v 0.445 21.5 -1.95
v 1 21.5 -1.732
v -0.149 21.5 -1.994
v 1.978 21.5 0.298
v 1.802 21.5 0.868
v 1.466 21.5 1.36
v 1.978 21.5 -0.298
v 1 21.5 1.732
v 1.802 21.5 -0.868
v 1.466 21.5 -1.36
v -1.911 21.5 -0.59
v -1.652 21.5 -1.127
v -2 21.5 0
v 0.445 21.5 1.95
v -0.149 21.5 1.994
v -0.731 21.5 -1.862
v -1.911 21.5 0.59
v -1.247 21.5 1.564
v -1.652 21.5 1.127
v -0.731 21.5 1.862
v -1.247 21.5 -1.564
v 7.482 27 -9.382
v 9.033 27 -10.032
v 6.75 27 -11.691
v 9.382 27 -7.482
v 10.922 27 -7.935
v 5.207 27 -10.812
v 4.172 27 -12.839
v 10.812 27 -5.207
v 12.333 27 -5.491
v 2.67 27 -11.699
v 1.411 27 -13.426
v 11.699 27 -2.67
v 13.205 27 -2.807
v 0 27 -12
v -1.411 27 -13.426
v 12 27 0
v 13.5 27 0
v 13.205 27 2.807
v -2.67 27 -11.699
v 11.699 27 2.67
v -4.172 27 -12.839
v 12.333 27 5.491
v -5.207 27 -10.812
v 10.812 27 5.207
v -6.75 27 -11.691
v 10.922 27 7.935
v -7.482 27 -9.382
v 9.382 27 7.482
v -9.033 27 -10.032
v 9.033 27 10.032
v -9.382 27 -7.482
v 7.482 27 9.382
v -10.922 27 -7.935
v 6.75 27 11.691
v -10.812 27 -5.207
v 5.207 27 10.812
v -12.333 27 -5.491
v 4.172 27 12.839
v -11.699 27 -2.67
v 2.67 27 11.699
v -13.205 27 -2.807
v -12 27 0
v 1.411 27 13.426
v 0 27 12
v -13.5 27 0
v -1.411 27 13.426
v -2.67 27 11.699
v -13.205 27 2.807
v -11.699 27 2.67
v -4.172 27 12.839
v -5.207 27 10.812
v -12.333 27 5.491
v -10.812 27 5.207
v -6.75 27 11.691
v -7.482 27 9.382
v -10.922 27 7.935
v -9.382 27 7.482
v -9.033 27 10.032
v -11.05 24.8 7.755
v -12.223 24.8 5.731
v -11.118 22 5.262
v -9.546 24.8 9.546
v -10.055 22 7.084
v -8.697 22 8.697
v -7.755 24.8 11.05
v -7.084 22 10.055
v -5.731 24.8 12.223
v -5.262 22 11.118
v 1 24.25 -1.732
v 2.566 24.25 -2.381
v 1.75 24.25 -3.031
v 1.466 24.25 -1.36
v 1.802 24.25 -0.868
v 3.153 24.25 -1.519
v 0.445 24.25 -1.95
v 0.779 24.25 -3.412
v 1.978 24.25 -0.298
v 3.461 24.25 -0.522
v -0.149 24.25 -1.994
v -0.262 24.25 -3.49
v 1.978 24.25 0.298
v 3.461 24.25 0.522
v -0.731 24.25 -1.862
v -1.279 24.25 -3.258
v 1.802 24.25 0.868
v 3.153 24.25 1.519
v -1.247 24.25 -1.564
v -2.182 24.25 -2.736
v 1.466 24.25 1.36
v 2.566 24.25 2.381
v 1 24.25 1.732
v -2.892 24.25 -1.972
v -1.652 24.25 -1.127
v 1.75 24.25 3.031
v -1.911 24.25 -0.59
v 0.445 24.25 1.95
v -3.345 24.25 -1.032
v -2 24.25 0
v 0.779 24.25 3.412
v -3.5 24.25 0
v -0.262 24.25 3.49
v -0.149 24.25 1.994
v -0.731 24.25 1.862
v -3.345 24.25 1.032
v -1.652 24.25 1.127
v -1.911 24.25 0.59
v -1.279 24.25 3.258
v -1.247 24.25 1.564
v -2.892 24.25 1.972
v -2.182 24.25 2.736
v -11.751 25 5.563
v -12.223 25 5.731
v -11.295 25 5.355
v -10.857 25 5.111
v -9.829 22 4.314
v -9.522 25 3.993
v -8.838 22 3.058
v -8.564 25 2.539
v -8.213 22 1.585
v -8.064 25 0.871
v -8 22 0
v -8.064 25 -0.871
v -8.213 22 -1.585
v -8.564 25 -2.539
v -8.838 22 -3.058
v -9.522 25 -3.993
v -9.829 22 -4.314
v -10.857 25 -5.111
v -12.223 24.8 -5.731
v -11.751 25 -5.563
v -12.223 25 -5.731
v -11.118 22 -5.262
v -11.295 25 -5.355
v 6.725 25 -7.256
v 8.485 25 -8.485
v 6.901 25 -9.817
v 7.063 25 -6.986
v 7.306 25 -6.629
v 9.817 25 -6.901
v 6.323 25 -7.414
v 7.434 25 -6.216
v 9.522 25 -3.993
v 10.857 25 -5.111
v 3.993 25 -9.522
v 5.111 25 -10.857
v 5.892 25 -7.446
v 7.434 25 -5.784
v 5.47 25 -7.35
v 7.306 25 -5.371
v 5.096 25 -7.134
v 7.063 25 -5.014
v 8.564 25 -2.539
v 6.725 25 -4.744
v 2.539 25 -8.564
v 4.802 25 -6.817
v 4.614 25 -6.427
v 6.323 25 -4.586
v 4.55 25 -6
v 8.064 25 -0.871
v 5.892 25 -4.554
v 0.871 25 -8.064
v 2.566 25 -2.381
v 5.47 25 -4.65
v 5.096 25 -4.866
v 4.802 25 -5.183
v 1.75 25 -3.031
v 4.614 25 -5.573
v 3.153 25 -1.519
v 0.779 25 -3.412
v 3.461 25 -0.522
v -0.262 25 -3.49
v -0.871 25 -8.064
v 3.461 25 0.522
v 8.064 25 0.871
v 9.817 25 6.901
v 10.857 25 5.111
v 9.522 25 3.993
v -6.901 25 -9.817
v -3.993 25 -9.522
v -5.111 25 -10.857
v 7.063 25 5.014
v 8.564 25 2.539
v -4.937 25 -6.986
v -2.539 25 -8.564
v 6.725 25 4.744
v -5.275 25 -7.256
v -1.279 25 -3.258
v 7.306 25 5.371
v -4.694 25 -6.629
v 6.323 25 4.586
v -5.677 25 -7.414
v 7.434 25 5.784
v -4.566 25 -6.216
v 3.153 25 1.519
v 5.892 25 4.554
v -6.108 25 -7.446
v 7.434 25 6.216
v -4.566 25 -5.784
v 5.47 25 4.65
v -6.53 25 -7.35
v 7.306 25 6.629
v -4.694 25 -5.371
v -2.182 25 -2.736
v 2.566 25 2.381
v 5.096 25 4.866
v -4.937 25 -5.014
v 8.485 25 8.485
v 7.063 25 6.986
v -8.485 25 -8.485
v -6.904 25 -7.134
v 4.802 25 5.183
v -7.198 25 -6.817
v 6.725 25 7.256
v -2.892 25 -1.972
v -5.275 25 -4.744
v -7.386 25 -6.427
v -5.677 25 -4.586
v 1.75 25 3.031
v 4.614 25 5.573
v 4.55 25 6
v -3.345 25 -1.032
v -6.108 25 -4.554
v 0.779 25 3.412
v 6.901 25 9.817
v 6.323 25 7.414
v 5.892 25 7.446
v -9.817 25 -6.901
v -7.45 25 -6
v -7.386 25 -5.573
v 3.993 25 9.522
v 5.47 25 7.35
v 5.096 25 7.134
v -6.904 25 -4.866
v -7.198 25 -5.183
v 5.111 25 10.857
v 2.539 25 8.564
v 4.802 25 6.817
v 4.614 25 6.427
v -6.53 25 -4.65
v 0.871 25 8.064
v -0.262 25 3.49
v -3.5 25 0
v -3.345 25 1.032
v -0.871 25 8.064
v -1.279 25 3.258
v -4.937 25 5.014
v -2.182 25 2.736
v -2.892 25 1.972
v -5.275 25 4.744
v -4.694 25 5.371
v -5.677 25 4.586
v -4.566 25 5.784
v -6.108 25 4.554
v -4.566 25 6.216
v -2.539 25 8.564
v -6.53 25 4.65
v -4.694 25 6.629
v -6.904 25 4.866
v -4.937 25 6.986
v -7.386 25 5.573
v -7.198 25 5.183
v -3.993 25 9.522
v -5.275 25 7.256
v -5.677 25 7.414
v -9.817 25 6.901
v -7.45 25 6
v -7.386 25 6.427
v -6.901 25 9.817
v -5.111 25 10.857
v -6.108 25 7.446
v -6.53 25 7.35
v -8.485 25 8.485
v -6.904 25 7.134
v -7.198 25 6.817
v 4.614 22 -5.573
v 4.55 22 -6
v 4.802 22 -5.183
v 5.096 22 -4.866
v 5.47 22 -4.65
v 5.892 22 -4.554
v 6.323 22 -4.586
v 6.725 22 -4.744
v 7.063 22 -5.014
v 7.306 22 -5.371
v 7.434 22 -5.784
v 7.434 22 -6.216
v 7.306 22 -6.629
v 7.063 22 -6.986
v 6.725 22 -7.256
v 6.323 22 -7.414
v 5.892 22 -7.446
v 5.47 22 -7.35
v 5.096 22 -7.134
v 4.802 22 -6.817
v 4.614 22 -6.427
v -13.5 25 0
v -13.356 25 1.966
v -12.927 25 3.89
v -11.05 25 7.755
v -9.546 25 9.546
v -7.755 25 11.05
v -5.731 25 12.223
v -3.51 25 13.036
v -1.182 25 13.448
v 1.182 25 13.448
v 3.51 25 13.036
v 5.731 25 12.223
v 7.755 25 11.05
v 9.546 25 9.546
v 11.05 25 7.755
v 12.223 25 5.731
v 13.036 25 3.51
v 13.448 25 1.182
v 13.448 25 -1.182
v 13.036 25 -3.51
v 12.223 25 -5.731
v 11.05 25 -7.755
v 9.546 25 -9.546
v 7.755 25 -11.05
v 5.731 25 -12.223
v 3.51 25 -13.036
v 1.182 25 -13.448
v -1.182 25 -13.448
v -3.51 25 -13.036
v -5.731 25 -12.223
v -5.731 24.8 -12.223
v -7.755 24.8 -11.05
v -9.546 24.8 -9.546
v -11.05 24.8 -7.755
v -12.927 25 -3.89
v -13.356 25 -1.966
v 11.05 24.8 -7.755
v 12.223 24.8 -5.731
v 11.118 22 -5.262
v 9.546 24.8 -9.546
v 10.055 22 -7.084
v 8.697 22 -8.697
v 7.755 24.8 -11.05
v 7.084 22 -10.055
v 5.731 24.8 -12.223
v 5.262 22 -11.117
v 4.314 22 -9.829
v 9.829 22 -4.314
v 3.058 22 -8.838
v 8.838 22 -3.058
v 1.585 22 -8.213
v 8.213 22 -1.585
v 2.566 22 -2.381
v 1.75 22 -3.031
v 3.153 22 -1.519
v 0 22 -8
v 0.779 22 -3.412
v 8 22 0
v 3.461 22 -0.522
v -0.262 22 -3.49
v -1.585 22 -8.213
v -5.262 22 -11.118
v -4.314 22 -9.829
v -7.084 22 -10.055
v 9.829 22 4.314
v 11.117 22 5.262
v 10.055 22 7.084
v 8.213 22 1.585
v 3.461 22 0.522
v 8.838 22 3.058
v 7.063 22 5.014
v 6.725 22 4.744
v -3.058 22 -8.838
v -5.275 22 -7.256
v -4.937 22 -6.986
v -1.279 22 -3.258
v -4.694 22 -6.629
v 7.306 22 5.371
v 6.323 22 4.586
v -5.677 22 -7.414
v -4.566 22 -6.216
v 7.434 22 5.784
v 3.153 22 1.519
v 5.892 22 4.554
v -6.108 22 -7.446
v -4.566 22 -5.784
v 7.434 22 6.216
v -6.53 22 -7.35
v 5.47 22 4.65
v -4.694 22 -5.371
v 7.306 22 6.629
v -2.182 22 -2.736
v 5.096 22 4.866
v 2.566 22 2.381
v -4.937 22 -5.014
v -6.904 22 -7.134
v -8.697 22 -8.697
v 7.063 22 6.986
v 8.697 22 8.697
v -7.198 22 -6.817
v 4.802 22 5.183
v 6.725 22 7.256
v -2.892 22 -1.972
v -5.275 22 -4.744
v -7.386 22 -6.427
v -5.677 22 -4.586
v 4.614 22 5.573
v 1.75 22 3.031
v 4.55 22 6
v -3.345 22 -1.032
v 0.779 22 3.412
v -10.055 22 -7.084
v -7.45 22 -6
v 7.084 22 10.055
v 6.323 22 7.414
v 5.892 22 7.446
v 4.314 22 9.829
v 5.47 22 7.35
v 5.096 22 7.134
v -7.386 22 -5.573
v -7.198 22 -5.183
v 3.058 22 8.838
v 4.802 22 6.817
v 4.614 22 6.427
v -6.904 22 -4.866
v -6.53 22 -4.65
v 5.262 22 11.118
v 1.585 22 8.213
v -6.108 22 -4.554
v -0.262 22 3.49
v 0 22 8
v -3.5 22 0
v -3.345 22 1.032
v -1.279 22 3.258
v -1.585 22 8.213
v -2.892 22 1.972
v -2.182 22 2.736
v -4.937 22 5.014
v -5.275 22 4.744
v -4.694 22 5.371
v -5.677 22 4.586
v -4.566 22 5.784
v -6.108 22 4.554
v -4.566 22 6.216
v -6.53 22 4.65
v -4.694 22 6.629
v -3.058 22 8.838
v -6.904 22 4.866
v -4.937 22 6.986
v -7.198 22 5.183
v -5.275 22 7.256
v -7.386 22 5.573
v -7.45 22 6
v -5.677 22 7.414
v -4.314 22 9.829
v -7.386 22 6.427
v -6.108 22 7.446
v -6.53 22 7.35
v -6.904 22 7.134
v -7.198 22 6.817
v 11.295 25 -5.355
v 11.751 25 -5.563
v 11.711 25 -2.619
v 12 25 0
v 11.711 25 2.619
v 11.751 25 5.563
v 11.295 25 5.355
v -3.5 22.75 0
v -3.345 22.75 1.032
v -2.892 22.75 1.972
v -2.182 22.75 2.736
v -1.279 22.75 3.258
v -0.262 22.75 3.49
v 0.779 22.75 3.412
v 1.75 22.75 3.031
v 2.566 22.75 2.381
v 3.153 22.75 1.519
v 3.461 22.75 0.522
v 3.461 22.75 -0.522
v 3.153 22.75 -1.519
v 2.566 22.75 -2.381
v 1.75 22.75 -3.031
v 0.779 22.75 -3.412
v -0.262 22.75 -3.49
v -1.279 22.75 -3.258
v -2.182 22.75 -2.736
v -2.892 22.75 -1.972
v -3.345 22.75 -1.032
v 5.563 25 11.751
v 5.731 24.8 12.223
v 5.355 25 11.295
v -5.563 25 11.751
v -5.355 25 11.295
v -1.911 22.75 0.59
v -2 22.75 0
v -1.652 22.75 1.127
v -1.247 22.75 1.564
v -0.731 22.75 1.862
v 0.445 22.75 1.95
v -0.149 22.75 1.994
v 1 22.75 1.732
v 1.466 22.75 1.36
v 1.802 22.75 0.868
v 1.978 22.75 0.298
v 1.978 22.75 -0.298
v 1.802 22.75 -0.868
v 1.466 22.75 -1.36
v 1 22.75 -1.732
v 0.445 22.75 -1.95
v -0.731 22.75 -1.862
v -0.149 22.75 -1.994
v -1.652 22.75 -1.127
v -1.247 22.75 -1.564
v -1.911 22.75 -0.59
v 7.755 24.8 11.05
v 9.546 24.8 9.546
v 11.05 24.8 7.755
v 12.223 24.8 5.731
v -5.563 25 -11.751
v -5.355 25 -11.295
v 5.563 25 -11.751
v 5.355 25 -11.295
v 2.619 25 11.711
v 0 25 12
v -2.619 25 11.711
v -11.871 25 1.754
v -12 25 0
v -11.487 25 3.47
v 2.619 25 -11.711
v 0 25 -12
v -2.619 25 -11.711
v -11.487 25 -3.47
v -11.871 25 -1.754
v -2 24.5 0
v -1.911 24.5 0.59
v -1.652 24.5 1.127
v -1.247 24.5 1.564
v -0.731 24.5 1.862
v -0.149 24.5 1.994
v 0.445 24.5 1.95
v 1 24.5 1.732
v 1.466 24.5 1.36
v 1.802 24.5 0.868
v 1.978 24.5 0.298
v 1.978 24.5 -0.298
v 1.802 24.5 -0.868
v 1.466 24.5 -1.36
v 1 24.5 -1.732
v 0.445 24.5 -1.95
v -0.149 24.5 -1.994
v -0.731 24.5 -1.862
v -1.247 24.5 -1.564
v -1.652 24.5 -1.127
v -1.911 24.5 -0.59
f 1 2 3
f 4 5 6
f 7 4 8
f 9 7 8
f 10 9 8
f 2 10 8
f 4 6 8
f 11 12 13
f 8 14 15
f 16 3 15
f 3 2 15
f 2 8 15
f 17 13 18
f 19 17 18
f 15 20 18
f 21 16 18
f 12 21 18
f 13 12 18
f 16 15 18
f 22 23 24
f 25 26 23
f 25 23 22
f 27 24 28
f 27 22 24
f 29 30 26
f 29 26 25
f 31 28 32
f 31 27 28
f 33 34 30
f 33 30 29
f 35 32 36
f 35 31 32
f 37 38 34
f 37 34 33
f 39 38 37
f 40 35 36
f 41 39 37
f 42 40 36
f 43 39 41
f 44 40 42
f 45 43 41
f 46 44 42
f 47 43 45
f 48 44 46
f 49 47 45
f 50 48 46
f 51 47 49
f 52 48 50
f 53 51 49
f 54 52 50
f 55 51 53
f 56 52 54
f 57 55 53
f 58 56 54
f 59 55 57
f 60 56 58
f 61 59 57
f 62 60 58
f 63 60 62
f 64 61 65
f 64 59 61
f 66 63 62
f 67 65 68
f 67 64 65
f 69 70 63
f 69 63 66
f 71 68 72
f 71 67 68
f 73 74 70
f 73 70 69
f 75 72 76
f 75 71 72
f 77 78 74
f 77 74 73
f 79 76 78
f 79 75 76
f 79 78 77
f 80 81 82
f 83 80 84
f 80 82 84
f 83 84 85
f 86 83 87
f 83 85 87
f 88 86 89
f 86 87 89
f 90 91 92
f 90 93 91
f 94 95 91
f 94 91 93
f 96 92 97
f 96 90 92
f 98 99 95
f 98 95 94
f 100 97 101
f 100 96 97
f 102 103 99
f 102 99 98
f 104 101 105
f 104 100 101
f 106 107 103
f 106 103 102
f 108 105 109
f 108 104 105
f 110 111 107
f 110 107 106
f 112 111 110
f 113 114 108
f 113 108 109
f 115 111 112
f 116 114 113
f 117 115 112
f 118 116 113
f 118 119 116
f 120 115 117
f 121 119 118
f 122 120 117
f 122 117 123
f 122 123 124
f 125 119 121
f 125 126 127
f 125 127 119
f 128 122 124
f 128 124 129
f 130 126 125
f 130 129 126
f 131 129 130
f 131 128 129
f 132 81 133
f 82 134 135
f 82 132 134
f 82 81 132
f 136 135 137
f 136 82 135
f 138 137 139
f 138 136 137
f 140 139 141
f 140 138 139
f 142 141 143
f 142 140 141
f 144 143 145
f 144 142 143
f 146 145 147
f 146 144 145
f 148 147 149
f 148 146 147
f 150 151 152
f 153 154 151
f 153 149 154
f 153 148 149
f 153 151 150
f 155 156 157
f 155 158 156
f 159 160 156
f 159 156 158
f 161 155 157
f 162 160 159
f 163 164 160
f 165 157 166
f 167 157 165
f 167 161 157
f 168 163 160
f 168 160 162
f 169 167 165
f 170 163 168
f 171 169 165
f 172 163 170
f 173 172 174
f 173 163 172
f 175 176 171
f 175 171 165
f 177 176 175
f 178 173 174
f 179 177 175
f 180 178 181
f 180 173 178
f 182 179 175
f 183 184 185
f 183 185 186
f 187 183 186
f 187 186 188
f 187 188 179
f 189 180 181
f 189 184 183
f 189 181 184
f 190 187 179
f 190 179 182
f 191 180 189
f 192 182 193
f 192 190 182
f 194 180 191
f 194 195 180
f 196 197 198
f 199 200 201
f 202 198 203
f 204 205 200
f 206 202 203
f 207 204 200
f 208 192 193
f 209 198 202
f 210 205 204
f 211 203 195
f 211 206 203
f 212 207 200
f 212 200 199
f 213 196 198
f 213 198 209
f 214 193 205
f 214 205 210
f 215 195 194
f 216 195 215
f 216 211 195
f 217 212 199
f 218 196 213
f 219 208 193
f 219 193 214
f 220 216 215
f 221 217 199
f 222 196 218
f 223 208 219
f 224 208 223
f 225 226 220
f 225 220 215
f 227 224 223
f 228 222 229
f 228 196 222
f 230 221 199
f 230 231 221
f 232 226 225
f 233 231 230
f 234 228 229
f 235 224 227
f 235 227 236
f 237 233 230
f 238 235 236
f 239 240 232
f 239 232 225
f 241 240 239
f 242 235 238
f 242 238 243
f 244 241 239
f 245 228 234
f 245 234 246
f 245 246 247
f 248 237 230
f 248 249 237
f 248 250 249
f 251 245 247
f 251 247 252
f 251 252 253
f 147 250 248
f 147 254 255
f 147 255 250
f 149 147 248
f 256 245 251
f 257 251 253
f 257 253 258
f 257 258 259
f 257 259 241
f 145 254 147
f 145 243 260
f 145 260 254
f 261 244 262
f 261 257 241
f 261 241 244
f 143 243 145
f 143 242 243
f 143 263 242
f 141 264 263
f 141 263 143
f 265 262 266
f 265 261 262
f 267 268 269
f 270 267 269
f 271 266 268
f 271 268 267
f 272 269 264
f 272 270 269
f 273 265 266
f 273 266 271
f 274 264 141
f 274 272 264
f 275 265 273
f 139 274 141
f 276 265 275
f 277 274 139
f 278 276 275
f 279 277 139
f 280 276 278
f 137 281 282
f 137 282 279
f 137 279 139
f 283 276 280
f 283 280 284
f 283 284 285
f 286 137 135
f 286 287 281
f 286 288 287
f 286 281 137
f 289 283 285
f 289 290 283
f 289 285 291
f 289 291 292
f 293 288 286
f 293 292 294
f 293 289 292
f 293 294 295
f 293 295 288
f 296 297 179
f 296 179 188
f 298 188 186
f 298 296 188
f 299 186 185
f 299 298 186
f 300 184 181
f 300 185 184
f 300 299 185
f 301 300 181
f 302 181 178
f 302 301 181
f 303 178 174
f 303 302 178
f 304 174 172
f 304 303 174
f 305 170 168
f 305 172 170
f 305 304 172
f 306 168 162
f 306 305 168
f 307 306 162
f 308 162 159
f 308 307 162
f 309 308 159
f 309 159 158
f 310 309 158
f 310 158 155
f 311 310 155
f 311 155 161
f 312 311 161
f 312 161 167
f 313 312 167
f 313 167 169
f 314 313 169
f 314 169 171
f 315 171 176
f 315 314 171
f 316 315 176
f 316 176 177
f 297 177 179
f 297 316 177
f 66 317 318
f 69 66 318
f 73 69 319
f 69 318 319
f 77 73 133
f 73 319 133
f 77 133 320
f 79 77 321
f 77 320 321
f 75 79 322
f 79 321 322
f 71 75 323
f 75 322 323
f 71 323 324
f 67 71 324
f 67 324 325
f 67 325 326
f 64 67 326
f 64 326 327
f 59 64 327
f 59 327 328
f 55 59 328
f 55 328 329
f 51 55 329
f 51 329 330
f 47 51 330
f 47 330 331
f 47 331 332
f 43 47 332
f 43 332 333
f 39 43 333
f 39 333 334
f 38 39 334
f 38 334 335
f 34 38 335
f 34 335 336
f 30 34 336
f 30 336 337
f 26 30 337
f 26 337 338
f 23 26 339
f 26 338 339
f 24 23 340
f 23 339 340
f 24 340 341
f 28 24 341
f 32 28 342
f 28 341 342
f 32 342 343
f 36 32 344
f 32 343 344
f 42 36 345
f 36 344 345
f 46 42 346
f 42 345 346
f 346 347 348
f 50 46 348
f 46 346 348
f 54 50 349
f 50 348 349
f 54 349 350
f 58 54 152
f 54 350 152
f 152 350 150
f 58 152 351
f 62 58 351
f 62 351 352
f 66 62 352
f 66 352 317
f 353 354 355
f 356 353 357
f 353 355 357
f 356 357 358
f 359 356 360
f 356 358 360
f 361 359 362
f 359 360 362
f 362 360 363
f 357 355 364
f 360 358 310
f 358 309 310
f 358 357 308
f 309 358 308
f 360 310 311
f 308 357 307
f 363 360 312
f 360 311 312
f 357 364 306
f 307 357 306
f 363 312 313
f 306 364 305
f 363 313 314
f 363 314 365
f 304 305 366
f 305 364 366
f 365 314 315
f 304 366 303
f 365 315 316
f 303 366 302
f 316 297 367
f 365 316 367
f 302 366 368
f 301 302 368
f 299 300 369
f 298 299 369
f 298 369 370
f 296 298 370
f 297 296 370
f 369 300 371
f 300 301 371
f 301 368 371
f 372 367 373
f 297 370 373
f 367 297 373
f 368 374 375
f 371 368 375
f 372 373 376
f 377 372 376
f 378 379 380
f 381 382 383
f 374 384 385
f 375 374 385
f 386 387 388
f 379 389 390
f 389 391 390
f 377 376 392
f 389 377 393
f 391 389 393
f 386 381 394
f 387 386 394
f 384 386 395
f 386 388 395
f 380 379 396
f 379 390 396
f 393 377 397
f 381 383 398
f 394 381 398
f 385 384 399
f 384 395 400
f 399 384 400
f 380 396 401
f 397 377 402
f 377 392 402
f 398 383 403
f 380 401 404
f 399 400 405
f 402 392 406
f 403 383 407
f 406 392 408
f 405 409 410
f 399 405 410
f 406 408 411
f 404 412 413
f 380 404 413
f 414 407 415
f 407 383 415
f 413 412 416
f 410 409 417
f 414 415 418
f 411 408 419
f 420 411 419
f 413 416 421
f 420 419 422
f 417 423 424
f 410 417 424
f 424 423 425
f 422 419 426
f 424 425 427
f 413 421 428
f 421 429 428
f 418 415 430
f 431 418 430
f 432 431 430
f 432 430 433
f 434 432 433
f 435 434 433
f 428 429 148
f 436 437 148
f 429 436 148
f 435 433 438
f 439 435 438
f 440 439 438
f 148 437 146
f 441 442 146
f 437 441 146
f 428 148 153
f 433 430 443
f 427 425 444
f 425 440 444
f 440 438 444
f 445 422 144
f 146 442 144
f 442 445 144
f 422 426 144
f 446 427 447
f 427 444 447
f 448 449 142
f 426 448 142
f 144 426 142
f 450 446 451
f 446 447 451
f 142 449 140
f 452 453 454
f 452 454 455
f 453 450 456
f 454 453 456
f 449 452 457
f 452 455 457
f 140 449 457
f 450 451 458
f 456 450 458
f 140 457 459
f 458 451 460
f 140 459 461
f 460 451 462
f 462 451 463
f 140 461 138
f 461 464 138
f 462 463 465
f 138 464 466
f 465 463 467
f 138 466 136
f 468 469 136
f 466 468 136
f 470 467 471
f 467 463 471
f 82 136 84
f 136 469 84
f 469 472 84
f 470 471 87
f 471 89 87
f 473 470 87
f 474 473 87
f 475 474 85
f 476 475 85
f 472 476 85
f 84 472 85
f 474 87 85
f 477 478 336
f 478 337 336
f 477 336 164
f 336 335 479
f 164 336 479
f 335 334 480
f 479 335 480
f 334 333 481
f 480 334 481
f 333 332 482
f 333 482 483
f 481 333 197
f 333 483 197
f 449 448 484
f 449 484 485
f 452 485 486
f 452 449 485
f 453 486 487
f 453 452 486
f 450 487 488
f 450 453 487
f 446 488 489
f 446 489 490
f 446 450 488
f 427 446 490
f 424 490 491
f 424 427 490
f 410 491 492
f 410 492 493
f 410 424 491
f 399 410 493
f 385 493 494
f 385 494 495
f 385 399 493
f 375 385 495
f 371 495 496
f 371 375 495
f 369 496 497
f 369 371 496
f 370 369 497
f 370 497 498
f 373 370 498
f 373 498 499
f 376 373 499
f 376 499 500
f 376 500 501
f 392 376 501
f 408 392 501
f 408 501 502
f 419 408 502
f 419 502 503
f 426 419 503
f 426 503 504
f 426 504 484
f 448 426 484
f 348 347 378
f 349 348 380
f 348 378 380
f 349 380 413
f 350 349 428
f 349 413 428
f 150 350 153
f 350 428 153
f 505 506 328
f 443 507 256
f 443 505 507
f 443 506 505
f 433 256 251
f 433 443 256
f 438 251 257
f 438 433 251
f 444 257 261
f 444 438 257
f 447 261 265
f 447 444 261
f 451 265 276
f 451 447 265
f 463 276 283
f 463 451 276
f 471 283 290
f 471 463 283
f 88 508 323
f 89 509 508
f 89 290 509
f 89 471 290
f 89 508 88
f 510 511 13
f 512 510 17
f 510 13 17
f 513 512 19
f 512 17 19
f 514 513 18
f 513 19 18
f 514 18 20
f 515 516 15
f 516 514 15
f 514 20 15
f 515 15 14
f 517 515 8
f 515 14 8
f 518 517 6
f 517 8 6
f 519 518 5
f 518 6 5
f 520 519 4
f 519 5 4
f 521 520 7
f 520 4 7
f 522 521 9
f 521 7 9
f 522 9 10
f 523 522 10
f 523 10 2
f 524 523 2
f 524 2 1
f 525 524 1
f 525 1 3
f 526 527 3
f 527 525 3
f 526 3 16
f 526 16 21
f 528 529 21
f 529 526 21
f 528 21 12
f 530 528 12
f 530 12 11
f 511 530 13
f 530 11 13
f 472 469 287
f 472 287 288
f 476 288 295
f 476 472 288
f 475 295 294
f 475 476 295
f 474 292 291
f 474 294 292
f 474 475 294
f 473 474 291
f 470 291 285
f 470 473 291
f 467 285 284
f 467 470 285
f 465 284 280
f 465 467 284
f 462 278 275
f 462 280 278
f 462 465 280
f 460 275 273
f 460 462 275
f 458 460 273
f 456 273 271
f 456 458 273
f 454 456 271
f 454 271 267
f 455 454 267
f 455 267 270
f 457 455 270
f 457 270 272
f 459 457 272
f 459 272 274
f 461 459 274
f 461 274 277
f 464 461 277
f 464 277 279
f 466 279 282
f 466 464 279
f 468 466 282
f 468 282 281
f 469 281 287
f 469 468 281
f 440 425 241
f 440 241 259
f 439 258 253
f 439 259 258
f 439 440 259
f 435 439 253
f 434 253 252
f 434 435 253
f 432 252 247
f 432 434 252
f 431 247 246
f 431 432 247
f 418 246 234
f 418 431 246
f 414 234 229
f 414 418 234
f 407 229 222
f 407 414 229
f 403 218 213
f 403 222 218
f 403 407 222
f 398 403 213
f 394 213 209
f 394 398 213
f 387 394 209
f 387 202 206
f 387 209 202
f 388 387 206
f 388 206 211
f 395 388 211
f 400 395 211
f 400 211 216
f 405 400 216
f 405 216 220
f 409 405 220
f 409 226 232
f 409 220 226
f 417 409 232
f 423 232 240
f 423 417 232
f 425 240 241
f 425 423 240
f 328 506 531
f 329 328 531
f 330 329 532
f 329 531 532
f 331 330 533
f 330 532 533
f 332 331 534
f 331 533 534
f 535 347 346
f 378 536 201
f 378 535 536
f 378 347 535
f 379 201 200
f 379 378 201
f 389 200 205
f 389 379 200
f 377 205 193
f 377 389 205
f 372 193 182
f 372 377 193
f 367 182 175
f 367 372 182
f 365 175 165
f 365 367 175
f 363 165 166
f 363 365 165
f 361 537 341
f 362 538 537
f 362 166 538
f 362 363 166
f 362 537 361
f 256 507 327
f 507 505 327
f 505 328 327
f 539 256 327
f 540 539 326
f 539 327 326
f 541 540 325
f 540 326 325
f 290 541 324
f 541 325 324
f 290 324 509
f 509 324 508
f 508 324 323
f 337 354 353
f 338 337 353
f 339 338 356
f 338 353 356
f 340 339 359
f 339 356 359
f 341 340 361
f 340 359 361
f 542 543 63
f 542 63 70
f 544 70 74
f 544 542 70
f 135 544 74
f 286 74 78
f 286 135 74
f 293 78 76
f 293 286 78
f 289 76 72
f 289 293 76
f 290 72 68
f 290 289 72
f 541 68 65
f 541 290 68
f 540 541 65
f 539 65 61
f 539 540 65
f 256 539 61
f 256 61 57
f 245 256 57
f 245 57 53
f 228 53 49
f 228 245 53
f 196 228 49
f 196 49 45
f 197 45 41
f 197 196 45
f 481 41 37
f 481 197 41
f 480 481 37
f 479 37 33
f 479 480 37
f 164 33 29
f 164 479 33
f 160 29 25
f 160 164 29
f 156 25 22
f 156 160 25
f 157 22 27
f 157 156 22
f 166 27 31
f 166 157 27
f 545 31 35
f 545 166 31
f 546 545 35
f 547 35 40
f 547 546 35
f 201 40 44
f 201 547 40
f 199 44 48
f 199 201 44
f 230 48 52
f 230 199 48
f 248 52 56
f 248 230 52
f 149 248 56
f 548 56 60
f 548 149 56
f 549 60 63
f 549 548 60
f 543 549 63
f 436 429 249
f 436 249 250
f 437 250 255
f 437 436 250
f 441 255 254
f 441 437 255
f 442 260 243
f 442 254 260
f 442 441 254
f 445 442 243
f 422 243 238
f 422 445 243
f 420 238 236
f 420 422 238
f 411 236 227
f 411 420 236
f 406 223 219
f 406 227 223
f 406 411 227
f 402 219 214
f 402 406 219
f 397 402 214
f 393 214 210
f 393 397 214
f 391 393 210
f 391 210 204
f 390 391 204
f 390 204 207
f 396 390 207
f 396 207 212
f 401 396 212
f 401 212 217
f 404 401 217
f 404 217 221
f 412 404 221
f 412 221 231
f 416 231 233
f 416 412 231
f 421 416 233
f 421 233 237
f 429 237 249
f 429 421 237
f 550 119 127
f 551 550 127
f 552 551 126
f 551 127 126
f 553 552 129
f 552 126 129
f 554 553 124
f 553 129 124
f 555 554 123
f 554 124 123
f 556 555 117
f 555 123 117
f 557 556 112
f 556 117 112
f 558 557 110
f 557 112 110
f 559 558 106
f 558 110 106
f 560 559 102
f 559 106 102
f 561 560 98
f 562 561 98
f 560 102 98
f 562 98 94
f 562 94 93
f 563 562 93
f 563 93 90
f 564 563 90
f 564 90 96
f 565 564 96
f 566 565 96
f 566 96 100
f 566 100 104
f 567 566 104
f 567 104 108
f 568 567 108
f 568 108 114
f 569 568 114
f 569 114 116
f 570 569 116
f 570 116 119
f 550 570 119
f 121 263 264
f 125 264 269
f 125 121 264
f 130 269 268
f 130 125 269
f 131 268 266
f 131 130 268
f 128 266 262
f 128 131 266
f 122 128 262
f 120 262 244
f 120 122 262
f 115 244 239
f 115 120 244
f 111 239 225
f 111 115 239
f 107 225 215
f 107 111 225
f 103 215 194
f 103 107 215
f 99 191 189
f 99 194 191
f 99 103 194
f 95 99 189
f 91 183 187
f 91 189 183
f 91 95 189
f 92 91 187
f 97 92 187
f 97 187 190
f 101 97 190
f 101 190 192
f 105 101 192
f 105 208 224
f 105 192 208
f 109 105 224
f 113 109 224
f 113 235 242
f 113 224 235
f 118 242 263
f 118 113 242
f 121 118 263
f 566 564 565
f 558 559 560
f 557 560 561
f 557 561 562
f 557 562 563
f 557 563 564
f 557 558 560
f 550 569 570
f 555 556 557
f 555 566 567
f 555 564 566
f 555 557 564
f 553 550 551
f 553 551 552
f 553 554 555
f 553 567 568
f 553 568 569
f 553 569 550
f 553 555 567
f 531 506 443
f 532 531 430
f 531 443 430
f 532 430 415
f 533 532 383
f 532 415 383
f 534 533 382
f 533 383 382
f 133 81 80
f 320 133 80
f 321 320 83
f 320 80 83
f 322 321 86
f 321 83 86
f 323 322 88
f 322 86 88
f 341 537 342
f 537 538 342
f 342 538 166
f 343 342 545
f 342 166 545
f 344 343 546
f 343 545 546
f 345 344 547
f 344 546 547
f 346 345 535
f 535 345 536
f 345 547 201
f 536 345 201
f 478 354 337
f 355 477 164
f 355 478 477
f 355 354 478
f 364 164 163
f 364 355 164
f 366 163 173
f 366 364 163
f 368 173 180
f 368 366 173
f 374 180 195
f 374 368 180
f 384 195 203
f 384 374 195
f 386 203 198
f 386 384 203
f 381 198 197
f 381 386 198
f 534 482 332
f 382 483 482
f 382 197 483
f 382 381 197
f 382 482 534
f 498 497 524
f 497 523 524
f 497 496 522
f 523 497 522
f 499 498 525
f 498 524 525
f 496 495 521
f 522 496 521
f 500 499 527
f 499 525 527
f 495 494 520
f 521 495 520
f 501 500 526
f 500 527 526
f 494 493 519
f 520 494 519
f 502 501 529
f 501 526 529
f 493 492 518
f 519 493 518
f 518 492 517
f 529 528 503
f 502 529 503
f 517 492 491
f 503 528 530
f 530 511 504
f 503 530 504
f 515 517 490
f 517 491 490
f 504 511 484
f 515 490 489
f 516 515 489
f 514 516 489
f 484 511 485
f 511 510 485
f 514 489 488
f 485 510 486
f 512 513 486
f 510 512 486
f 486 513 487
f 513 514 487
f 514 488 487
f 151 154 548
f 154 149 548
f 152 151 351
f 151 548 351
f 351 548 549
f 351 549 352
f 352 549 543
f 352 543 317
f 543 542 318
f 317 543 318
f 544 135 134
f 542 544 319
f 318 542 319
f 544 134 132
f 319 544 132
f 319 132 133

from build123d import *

# Parameters (mm, degrees)
CYLINDER032_R             = 1.45
CYLINDER032_DEPTH         = 10
CYLINDER033_R             = 1.45
CYLINDER033_DEPTH         = 10
CYLINDER034_R             = 1.45
CYLINDER034_DEPTH         = 10
CYLINDER031_R             = 1.45
CYLINDER031_DEPTH         = 10
CYLINDER028_R             = 3.5
CYLINDER028_DEPTH         = 10
CYLINDER026_R             = 6
CYLINDER026_DEPTH         = 10
CYLINDER027_R             = 6
CYLINDER027_DEPTH         = 10
CYLINDER024_R             = 6
CYLINDER024_DEPTH         = 10
CYLINDER025_R             = 6
CYLINDER025_DEPTH         = 10
CYLINDER023_R             = 13.5
CYLINDER023_DEPTH         = 3
CHAMFER003_SIZE2          = 1.2
CHAMFER003_SIZE           = 2.8
CYLINDER010_R             = 12
CYLINDER010_DEPTH         = 2
CYLINDER011_R             = 13.5
CYLINDER011_DEPTH         = 2
CYLINDER030_R             = 2
CYLINDER030_DEPTH         = 3
CYLINDER029_R             = 3.5
CYLINDER029_DEPTH         = 1.5
FUSION008_ROLL_ANGLE      = 90
FUSION008_PLACEMENT_ANGLE = 180


with BuildPart() as cylinder032:
    # Cylinder032 → Cylinder032 (new body)
    with BuildSketch(Plane(origin=(6, -6, 0), x_dir=(1, 0, 0), z_dir=(0, 0, 1))):
        Circle(CYLINDER032_R)
    extrude(amount=CYLINDER032_DEPTH)


with BuildPart() as cylinder033:
    # Cylinder033 → Cylinder033 (new body)
    with BuildSketch(Plane(origin=(-6, -6, 0), x_dir=(1, 0, 0), z_dir=(0, 0, 1))):
        Circle(CYLINDER033_R)
    extrude(amount=CYLINDER033_DEPTH)


with BuildPart() as cylinder034:
    # Cylinder034 → Cylinder034 (new body)
    with BuildSketch(Plane(origin=(-6, 6, 0), x_dir=(1, 0, 0), z_dir=(0, 0, 1))):
        Circle(CYLINDER034_R)
    extrude(amount=CYLINDER034_DEPTH)


with BuildPart() as cylinder031:
    # Cylinder031 → Cylinder031 (new body)
    with BuildSketch(Plane(origin=(6, 6, 0), x_dir=(1, 0, 0), z_dir=(0, 0, 1))):
        Circle(CYLINDER031_R)
    extrude(amount=CYLINDER031_DEPTH)


with BuildPart() as cylinder028:
    # Cylinder028 → Cylinder028 (new body)
    with BuildSketch(Plane.XY):
        Circle(CYLINDER028_R)
    extrude(amount=CYLINDER028_DEPTH)


with BuildPart() as cylinder026:
    # Cylinder026 → Cylinder026 (new body)
    with BuildSketch(Plane(origin=(0, 14, 0), x_dir=(1, 0, 0), z_dir=(0, 0, 1))):
        Circle(CYLINDER026_R)
    extrude(amount=CYLINDER026_DEPTH)


with BuildPart() as cylinder027:
    # Cylinder027 → Cylinder027 (new body)
    with BuildSketch(Plane(origin=(-14, 0, 0), x_dir=(1, 0, 0), z_dir=(0, 0, 1))):
        Circle(CYLINDER027_R)
    extrude(amount=CYLINDER027_DEPTH)


with BuildPart() as cylinder024:
    # Cylinder024 → Cylinder024 (new body)
    with BuildSketch(Plane(origin=(14, 0, 0), x_dir=(1, 0, 0), z_dir=(0, 0, 1))):
        Circle(CYLINDER024_R)
    extrude(amount=CYLINDER024_DEPTH)


with BuildPart() as cylinder025:
    # Cylinder025 → Cylinder025 (new body)
    with BuildSketch(Plane(origin=(0, -14, 0), x_dir=(1, 0, 0), z_dir=(0, 0, 1))):
        Circle(CYLINDER025_R)
    extrude(amount=CYLINDER025_DEPTH)


with BuildPart() as cut022:
    # Cylinder023 → Cylinder023 (new body)
    with BuildSketch(Plane.XY.offset(2)):
        Circle(CYLINDER023_R)
    extrude(amount=CYLINDER023_DEPTH)

    # Chamfer003
    chamfer003_edges = [cut022.edges().sort_by_distance(p)[0] for p in [
        (-13.5, 0, 2),
    ]]
    chamfer003_side = cut022.faces().sort_by_distance((-13.5, 0, 3.5))[0]
    chamfer(chamfer003_edges, length=CHAMFER003_SIZE, length2=CHAMFER003_SIZE2, reference=chamfer003_side)

    # Cut017: cut Cylinder025
    add(cylinder025.part, mode=Mode.SUBTRACT)

    # Cut018: cut Cylinder024
    add(cylinder024.part, mode=Mode.SUBTRACT)

    # Cut019: cut Cylinder027
    add(cylinder027.part, mode=Mode.SUBTRACT)

    # Cut020: cut Cylinder026
    add(cylinder026.part, mode=Mode.SUBTRACT)

    # Cut021: cut Cylinder028
    add(cylinder028.part, mode=Mode.SUBTRACT)


with BuildPart() as cylinder010:
    # Cylinder010 → Cylinder010 (new body)
    with BuildSketch(Plane.XY.offset(5)):
        Circle(CYLINDER010_R)
    extrude(amount=CYLINDER010_DEPTH)


with BuildPart() as stator_full:
    # Cylinder011 → Cylinder011 (new body)
    with BuildSketch(Plane.XY.offset(5)):
        Circle(CYLINDER011_R)
    extrude(amount=CYLINDER011_DEPTH)

    # Cut011: cut Cylinder010
    add(cylinder010.part, mode=Mode.SUBTRACT)

    # Fusion007: union Cut022
    add(cut022.part)

    # Cut022: cut Cylinder031
    add(cylinder031.part, mode=Mode.SUBTRACT)

    # Cut023: cut Cylinder034
    add(cylinder034.part, mode=Mode.SUBTRACT)

    # Cut024: cut Cylinder033
    add(cylinder033.part, mode=Mode.SUBTRACT)

    # Cut025: cut Cylinder032
    add(cylinder032.part, mode=Mode.SUBTRACT)


with BuildPart() as cylinder030:
    # Cylinder030 → Cylinder030 (new body)
    with BuildSketch(Plane.XY.offset(1.5)):
        Circle(CYLINDER030_R)
    extrude(amount=CYLINDER030_DEPTH)


with BuildPart() as stator:
    # Cylinder029 → Cylinder029 (new body)
    with BuildSketch(Plane.XY.offset(2.75)):
        Circle(CYLINDER029_R)
    extrude(amount=CYLINDER029_DEPTH)

    # Fusion006: union Cylinder030
    add(cylinder030.part)

    # Fusion008: union Stator_Full
    add(stator_full.part)


with BuildPart() as stator_1:
    # Fusion008 roll: moved
    add(stator.part.rotate(Axis((0, 0, 0), (1, 0, 0)), FUSION008_ROLL_ANGLE))


with BuildPart() as stator_2:
    # Fusion008 placement: moved
    add(stator_1.part.moved(Location((0, 20, 0))).rotate(Axis((0, 20, 0), (0, 0, 1)), FUSION008_PLACEMENT_ANGLE))


solid = stator_2.part
